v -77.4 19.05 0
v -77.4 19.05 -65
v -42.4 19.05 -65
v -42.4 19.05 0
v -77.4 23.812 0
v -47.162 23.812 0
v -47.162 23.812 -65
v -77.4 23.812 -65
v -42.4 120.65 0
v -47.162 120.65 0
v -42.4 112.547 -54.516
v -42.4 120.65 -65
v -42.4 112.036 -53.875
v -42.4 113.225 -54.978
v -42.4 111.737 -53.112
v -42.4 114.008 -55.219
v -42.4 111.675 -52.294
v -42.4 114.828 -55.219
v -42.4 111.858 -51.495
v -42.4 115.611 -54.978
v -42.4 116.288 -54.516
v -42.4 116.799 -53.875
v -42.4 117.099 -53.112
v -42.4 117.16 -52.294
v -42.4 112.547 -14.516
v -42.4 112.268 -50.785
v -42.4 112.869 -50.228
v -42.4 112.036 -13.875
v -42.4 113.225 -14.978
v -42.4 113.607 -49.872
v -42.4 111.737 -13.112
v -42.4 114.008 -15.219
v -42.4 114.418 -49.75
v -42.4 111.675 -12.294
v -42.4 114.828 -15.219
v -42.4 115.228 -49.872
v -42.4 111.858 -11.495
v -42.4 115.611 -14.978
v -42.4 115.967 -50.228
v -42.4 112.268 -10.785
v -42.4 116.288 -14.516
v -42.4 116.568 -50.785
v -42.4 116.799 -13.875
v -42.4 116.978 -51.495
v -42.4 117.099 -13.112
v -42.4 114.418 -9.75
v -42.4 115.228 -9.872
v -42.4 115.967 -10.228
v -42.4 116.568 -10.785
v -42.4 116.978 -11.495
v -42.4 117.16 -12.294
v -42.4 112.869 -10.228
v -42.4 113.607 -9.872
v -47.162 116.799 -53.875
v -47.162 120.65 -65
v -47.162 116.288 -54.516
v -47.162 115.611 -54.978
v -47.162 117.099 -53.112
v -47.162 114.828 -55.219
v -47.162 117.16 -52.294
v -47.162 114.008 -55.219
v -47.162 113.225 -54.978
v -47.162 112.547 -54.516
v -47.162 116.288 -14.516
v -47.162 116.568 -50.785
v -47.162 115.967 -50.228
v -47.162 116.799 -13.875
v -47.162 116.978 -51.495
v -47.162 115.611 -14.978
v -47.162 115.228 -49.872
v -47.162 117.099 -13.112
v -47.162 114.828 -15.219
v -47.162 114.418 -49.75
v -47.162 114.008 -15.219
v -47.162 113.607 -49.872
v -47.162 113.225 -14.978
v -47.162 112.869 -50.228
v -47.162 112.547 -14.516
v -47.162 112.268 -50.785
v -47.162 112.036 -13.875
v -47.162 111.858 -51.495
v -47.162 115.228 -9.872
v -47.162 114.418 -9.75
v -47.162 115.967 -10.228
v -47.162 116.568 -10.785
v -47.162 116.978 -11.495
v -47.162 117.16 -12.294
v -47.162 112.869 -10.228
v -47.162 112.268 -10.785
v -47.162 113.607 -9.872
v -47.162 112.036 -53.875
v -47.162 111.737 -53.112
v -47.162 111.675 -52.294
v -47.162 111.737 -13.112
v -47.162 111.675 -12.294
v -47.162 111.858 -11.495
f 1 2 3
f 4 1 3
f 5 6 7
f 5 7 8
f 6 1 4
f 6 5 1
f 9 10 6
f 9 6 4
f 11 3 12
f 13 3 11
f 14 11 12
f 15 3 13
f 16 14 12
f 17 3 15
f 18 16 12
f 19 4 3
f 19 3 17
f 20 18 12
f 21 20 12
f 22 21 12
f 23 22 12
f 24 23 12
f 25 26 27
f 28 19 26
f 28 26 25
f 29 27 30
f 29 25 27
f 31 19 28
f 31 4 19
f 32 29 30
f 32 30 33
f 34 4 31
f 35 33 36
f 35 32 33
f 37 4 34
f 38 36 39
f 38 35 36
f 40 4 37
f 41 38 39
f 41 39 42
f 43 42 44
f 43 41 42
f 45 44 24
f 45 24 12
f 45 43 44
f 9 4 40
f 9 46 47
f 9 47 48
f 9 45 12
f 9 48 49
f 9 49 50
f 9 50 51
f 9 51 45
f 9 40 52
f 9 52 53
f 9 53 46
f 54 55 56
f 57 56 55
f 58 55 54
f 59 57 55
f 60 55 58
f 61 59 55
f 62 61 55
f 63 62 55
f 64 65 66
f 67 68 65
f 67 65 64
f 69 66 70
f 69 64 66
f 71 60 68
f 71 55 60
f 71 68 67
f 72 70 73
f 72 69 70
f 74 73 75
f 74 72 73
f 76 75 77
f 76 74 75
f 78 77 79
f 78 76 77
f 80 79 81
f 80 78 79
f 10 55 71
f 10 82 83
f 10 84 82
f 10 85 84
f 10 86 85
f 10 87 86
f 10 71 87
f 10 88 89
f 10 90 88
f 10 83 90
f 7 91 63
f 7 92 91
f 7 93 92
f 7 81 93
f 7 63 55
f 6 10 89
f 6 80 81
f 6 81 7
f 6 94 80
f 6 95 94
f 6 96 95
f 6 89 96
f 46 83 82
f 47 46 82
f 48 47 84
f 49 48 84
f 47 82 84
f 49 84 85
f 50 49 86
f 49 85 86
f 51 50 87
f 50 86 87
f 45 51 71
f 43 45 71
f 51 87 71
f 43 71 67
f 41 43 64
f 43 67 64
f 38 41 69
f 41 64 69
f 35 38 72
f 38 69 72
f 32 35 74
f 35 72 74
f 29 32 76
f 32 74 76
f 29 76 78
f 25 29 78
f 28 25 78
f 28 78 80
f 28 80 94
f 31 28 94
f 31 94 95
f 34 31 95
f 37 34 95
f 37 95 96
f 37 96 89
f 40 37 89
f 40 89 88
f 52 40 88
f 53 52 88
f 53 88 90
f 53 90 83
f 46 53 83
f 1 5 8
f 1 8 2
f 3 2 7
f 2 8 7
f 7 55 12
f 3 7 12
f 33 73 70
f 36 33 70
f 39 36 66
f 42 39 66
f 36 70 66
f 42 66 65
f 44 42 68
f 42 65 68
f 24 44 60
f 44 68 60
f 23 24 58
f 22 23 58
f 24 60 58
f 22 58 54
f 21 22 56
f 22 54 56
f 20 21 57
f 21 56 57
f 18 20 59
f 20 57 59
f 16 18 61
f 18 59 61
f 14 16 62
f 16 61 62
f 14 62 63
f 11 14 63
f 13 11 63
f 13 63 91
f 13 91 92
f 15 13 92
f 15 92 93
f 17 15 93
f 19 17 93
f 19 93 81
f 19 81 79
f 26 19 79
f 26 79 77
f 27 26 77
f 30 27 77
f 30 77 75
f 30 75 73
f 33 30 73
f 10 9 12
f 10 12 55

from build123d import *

# Parameters (mm, degrees)
BOSS_EXTRUDE1_DEPTH = 65
SKETCH2_R           = 2.75
CUT_EXTRUDE1_DEPTH  = 10


with BuildPart() as part:
    # Sketch1 → Boss-Extrude1 (new body)
    with BuildSketch(Plane.XY):
        Polygon((-77.4, 19.05), (-42.4, 19.05), (-42.4, 120.65), (-47.1625, 120.65), (-47.1625, 23.8125), (-77.4, 23.8125), align=None)
    extrude(amount=-BOSS_EXTRUDE1_DEPTH)

    # Sketch2 → Cut-Extrude1 (cut)
    with BuildSketch(Plane.ZY.offset(47.1625)):
        with Locations((-12.5, 114.417723435)):
            Circle(SKETCH2_R)
        with Locations((-52.5, 114.417723435)):
            Circle(SKETCH2_R)
    extrude(amount=-CUT_EXTRUDE1_DEPTH, mode=Mode.SUBTRACT)


solid = part.part
